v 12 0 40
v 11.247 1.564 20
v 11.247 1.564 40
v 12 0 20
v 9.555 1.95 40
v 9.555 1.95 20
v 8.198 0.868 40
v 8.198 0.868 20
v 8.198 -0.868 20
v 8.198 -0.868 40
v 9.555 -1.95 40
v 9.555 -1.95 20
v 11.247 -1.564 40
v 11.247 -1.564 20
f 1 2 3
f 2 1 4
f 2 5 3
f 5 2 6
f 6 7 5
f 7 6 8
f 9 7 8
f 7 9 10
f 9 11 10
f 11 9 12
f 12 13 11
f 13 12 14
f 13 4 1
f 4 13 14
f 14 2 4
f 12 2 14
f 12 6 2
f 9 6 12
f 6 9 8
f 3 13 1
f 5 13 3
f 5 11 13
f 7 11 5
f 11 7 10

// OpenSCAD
// Generated by generate_scads.py
translate([10,0,30]) {
  cylinder(h=20, r=2, center=true);
}
